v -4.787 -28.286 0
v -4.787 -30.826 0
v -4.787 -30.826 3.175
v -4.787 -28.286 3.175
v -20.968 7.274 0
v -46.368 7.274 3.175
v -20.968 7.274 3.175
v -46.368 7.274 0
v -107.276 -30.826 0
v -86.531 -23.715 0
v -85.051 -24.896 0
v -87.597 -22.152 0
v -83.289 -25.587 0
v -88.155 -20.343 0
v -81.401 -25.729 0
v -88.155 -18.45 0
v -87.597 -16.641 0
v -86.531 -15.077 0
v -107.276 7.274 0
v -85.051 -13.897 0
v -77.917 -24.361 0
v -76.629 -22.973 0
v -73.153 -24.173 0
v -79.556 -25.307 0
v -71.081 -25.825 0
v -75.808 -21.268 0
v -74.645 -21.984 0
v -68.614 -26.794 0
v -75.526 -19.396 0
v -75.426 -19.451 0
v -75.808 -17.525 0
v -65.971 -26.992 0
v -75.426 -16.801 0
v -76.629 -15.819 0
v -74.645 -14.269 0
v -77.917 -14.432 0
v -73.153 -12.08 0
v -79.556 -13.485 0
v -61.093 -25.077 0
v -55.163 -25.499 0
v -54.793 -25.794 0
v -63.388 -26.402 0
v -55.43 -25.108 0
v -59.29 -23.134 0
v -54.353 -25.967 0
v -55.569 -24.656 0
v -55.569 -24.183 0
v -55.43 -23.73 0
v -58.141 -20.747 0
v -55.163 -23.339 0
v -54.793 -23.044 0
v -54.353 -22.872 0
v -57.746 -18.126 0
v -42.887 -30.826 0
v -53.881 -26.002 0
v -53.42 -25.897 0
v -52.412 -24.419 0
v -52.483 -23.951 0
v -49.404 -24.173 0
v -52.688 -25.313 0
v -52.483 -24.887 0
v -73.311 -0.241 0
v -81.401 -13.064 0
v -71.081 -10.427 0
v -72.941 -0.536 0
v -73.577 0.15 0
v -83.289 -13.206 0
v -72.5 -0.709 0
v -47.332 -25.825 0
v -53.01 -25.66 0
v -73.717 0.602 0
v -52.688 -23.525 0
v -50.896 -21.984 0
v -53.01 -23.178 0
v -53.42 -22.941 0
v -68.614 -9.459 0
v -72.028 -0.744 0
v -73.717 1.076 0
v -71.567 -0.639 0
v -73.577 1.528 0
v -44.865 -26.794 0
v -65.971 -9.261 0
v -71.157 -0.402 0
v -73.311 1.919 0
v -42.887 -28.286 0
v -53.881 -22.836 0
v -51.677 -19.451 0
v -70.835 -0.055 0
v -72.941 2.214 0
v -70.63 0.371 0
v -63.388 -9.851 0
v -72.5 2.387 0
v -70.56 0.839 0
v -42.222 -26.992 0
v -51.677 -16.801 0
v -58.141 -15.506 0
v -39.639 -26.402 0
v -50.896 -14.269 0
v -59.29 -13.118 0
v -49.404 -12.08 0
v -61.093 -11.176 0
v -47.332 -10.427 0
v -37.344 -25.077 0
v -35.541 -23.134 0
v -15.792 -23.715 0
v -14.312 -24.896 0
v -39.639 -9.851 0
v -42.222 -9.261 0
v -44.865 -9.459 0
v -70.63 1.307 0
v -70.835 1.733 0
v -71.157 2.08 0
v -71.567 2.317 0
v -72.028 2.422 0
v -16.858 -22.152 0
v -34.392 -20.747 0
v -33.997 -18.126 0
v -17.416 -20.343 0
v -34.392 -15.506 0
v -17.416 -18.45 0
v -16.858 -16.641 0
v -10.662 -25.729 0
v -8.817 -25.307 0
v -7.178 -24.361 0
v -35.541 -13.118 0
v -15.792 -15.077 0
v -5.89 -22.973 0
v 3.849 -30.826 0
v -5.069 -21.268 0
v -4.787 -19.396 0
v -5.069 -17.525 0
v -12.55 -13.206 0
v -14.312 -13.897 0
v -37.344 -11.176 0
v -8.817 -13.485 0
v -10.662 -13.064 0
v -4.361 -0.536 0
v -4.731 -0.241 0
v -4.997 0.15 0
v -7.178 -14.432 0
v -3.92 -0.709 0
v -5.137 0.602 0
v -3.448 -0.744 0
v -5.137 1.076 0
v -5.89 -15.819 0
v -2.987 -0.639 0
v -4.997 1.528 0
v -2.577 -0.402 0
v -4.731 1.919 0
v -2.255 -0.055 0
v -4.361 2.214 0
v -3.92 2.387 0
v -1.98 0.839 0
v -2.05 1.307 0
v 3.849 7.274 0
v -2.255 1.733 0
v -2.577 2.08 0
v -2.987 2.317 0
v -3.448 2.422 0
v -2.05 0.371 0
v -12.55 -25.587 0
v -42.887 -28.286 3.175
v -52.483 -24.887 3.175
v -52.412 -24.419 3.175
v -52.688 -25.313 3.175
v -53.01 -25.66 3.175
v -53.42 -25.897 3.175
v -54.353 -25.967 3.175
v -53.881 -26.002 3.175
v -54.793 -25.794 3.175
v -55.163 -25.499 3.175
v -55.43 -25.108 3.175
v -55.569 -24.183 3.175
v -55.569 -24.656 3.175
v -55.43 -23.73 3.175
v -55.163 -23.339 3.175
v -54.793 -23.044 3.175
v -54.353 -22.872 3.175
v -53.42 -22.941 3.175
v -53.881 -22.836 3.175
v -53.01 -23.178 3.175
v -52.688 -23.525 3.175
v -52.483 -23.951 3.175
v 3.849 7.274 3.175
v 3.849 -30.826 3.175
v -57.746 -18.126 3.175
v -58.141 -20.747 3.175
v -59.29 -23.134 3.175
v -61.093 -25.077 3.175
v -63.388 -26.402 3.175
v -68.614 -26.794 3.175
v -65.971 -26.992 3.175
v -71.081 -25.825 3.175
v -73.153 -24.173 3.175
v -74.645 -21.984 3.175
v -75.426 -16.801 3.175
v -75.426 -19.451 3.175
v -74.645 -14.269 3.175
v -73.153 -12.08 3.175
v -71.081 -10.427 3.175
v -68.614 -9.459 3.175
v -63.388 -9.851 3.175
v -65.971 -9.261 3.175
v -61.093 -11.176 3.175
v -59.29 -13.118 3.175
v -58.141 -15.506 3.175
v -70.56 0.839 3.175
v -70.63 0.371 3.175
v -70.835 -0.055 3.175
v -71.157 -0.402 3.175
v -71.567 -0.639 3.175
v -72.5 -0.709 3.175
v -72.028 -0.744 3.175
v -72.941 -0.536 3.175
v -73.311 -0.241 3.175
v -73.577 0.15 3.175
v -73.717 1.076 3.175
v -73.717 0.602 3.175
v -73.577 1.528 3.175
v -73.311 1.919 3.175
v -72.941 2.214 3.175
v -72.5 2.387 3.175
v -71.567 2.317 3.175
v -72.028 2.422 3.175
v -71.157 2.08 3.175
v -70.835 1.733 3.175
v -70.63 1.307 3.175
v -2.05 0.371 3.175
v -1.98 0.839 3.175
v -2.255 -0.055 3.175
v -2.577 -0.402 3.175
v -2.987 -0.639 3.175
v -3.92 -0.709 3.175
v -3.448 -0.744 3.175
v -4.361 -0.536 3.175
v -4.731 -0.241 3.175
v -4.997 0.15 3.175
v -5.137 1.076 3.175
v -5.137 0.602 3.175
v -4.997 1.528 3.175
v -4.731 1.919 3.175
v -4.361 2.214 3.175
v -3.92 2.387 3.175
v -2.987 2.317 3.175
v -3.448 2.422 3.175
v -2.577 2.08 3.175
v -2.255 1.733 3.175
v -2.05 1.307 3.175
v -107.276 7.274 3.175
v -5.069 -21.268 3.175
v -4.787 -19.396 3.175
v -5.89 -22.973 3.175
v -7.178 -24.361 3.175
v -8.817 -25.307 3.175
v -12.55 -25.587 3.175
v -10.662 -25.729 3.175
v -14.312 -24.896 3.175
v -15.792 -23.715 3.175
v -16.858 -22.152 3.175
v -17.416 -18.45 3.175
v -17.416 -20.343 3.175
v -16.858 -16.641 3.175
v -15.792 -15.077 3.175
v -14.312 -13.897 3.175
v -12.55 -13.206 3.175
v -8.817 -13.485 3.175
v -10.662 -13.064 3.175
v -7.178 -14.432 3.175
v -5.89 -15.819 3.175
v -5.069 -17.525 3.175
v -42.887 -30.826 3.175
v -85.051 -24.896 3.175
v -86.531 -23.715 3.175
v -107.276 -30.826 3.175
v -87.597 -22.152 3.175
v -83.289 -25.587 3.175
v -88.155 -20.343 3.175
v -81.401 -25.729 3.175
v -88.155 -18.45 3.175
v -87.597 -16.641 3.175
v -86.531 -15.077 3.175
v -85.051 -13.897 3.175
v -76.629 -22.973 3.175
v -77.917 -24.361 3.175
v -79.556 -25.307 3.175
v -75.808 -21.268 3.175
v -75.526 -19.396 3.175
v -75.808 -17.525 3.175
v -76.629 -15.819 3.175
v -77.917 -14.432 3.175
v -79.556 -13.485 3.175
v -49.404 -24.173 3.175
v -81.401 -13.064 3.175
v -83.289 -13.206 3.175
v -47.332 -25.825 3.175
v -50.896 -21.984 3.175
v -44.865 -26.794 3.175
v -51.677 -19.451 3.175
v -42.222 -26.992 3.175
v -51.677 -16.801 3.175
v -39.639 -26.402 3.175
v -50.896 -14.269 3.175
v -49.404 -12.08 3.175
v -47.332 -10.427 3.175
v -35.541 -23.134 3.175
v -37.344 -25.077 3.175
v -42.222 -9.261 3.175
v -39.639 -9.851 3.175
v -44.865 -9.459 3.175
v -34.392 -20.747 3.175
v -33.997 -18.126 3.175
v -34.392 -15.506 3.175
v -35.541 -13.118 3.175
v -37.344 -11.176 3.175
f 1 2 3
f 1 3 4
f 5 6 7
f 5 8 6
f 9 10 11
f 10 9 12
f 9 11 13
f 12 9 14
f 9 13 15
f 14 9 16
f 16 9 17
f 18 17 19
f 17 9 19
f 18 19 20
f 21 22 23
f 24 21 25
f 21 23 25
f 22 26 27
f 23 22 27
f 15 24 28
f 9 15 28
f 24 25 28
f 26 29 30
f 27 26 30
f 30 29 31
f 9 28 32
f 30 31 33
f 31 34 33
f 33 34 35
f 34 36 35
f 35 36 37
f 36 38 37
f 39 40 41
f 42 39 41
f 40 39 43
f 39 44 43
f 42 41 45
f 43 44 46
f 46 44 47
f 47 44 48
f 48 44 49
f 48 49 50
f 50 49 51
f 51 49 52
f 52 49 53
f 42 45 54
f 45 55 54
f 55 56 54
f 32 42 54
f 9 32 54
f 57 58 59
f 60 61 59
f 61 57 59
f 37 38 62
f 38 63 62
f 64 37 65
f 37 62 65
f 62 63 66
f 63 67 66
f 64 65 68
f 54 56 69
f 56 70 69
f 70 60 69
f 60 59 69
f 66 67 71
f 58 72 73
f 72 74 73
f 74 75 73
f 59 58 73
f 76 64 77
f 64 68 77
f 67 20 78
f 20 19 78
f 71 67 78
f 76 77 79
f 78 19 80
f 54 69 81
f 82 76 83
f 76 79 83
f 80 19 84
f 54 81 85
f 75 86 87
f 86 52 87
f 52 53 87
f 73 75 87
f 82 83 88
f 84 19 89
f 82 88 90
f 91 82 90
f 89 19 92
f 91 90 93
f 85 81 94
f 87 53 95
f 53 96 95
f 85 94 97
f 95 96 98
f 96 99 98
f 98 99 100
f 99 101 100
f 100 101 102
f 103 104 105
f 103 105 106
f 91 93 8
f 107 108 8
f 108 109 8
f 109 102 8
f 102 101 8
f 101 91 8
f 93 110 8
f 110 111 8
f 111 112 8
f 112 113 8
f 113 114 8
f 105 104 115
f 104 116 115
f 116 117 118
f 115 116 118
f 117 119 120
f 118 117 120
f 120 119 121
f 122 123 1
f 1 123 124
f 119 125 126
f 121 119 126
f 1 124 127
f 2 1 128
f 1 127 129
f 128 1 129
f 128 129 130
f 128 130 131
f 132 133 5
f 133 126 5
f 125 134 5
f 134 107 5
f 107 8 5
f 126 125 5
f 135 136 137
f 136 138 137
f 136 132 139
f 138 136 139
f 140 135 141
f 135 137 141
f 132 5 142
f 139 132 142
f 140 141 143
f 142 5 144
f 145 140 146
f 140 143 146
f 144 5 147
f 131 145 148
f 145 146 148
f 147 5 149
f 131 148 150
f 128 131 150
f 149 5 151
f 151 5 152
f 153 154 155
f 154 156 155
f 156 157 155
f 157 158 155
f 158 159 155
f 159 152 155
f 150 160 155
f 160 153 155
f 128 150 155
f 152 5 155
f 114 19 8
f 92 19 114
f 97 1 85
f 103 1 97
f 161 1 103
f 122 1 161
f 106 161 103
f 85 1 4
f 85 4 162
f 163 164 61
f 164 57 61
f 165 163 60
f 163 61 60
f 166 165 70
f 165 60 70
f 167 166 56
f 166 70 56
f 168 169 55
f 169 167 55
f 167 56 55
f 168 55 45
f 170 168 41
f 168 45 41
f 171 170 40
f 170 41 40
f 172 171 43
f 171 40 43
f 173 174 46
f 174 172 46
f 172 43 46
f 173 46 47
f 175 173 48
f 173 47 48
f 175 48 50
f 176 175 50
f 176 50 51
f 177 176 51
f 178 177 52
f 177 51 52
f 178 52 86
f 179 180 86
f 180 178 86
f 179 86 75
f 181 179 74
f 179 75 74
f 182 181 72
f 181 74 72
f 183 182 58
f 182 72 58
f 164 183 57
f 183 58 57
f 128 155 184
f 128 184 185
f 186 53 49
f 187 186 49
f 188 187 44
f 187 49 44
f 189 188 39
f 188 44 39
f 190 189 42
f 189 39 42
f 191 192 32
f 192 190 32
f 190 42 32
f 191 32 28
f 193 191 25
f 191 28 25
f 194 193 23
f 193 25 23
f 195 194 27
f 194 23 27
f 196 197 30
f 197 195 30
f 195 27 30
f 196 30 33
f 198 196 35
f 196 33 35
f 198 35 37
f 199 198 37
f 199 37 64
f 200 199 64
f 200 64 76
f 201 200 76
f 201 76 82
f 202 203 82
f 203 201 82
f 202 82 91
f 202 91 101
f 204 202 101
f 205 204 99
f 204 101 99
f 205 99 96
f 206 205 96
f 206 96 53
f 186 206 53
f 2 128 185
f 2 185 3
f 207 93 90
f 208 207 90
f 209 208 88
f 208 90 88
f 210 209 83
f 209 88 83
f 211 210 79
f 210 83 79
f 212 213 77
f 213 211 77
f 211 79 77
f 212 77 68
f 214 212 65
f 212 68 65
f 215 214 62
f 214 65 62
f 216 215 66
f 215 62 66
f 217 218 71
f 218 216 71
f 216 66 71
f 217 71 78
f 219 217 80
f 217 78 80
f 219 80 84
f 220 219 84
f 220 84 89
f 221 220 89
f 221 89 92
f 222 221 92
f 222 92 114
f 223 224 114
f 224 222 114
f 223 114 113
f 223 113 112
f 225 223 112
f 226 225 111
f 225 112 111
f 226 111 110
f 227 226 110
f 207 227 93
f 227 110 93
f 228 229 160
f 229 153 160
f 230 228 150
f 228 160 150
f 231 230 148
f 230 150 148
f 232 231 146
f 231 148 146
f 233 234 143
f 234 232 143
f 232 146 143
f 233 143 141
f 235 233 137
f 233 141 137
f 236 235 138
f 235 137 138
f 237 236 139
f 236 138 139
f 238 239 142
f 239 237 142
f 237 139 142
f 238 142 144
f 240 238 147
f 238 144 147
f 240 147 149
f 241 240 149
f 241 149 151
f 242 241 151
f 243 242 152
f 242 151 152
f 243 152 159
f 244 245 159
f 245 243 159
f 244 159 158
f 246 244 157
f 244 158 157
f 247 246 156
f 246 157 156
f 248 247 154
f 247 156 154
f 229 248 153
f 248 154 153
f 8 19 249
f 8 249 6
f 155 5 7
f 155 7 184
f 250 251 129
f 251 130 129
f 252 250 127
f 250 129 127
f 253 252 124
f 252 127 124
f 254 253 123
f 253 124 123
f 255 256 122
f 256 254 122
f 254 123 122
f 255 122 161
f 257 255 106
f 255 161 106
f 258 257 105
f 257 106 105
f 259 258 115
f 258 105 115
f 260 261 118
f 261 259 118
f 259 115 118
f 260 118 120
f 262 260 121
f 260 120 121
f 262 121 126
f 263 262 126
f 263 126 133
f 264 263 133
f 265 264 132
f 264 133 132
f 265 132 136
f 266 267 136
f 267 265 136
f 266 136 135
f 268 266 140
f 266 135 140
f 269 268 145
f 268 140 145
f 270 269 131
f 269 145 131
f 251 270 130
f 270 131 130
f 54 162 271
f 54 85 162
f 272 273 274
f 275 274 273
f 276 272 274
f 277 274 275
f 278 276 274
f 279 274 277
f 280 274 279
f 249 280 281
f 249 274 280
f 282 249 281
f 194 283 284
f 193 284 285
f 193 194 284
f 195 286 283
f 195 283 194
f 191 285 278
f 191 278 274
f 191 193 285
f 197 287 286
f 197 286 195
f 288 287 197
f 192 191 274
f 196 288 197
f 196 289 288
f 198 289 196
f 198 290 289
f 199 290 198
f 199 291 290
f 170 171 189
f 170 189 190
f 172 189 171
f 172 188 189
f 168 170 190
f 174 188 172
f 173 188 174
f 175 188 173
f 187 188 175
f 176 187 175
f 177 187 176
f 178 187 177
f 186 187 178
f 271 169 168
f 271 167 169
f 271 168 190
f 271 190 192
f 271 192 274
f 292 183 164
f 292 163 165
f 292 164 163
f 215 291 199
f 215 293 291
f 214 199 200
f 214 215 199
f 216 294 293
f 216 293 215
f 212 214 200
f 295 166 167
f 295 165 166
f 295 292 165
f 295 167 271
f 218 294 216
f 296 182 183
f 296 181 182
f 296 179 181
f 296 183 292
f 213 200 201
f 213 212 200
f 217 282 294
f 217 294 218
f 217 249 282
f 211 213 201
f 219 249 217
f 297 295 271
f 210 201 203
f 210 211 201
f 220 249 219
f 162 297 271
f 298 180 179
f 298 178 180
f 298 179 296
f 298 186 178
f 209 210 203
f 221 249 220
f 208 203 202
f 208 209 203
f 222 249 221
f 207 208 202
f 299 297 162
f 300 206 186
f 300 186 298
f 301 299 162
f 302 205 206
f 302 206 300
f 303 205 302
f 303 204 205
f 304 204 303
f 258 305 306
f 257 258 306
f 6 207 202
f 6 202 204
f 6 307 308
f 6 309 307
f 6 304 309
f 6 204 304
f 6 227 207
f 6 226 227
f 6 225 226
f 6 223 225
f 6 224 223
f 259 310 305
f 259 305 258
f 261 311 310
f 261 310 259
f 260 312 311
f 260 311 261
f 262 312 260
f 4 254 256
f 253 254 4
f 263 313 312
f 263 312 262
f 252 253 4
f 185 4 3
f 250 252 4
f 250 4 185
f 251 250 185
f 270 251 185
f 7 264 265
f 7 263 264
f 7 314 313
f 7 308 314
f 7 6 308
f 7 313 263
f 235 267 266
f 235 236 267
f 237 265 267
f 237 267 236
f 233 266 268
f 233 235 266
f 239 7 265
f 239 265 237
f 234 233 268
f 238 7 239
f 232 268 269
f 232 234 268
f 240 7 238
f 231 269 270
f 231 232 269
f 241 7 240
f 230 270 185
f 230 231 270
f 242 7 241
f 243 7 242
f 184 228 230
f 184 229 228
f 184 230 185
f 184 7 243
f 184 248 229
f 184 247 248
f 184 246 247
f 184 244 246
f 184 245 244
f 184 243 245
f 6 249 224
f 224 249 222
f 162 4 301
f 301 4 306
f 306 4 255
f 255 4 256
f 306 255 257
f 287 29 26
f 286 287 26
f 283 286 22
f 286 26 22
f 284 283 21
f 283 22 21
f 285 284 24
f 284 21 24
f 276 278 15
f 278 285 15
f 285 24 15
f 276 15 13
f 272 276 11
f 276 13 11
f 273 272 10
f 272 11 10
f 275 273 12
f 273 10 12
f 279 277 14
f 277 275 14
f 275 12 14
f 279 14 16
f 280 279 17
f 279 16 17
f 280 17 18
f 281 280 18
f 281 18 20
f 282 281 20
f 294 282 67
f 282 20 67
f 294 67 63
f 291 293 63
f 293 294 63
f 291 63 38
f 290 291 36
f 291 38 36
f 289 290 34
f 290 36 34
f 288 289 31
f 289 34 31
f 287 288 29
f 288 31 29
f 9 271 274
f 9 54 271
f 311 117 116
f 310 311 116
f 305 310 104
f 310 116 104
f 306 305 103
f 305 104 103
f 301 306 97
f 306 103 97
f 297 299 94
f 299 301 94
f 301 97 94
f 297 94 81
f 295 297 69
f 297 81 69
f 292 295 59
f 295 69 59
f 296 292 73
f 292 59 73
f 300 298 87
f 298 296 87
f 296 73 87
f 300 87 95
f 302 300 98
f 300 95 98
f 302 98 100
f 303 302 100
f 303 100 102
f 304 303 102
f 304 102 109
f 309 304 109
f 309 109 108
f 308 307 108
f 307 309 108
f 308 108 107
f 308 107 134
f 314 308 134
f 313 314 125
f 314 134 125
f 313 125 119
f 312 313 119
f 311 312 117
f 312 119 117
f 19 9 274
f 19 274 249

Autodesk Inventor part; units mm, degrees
ref_plane "YZ Plane" through (0, 0, 0) normal (1, 0, 0) x (0, 1, 0)
ref_plane "XZ Plane" through (0, 0, 0) normal (0, 1, 0) x (-1, 0, 0)
ref_plane "XY Plane" through (0, 0, 0) normal (0, 0, 1) x (1, 0, 0)
sketch "Sketch1" plane through (0, 0, 0) normal (0, 0, 1) x (1, 0, 0)
  line L0 (-107.2757, 7.2736) -> (3.8493, 7.2736)
  line L1 (3.8493, 7.2736) -> (3.8493, -30.8264)
  line L2 (3.8493, -30.8264) -> (-107.2757, -30.8264)
  line L3 (-107.2757, -30.8264) -> (-107.2757, 7.2736)
  circle A0 centre (-72.1471, 0.8391) radius 1.5875
  circle A1 centre (-53.9997, -24.4192) radius 1.5875
  circle A2 centre (-3.5671, 0.8391) radius 1.5875
  circle A3 centre (-66.6357, -18.1264) radius 8.89
  circle A4 centre (-42.8867, -18.1264) radius 8.89
  circle A5 centre (-81.8757, -19.3964) radius 6.35
  circle A6 centre (-11.1367, -19.3964) radius 6.35
  line L4 (-42.8867, -30.8264) -> (-4.7867, -30.8264)
  line L5 (-4.7867, -30.8264) -> (-4.7867, -28.2864)
  line L6 (-4.7867, -28.2864) -> (-42.8867, -28.2864)
  line L7 (-42.8867, -28.2864) -> (-42.8867, -30.8264)
  line L8 (-46.3681, 7.2736) -> (-20.9681, 7.2736)
  point P0 (0, 0)
  dimension "d2" = 111.125
  dimension "d3" = 38.1
  dimension "d4" = 3.175
  dimension "d5" = 3.175
  dimension "d6" = 3.175
  dimension "d7" = 12.7
  dimension "d8" = 12.7
  dimension "d9" = 17.78
  dimension "d10" = 17.78
  dimension "d11" = 12.7
  dimension "d12" = 12.7
  dimension "d13" = 23.749
  dimension "d14" = 11.43
  dimension "d15" = 11.43
  dimension "d16" = 15.24
  dimension "d17" = 31.75
  dimension "d18" = 6.4345
  dimension "d19" = 6.4345
  dimension "d20" = 68.58
  dimension "d21" = 6.4071
  dimension "d22" = 11.1131
  dimension "d23" = 5.5114
  dimension "d24" = 2.54
  dimension "d25" = 38.1
  dimension "d26" = 0
  dimension "d27" = 25.4
extrude "Extrusion1" add sketch "Sketch1" along normal blind 3.175 contours L0 L1 L2 L5 L6 L7 L3
properties part number "Dish_Injector_Wall"
